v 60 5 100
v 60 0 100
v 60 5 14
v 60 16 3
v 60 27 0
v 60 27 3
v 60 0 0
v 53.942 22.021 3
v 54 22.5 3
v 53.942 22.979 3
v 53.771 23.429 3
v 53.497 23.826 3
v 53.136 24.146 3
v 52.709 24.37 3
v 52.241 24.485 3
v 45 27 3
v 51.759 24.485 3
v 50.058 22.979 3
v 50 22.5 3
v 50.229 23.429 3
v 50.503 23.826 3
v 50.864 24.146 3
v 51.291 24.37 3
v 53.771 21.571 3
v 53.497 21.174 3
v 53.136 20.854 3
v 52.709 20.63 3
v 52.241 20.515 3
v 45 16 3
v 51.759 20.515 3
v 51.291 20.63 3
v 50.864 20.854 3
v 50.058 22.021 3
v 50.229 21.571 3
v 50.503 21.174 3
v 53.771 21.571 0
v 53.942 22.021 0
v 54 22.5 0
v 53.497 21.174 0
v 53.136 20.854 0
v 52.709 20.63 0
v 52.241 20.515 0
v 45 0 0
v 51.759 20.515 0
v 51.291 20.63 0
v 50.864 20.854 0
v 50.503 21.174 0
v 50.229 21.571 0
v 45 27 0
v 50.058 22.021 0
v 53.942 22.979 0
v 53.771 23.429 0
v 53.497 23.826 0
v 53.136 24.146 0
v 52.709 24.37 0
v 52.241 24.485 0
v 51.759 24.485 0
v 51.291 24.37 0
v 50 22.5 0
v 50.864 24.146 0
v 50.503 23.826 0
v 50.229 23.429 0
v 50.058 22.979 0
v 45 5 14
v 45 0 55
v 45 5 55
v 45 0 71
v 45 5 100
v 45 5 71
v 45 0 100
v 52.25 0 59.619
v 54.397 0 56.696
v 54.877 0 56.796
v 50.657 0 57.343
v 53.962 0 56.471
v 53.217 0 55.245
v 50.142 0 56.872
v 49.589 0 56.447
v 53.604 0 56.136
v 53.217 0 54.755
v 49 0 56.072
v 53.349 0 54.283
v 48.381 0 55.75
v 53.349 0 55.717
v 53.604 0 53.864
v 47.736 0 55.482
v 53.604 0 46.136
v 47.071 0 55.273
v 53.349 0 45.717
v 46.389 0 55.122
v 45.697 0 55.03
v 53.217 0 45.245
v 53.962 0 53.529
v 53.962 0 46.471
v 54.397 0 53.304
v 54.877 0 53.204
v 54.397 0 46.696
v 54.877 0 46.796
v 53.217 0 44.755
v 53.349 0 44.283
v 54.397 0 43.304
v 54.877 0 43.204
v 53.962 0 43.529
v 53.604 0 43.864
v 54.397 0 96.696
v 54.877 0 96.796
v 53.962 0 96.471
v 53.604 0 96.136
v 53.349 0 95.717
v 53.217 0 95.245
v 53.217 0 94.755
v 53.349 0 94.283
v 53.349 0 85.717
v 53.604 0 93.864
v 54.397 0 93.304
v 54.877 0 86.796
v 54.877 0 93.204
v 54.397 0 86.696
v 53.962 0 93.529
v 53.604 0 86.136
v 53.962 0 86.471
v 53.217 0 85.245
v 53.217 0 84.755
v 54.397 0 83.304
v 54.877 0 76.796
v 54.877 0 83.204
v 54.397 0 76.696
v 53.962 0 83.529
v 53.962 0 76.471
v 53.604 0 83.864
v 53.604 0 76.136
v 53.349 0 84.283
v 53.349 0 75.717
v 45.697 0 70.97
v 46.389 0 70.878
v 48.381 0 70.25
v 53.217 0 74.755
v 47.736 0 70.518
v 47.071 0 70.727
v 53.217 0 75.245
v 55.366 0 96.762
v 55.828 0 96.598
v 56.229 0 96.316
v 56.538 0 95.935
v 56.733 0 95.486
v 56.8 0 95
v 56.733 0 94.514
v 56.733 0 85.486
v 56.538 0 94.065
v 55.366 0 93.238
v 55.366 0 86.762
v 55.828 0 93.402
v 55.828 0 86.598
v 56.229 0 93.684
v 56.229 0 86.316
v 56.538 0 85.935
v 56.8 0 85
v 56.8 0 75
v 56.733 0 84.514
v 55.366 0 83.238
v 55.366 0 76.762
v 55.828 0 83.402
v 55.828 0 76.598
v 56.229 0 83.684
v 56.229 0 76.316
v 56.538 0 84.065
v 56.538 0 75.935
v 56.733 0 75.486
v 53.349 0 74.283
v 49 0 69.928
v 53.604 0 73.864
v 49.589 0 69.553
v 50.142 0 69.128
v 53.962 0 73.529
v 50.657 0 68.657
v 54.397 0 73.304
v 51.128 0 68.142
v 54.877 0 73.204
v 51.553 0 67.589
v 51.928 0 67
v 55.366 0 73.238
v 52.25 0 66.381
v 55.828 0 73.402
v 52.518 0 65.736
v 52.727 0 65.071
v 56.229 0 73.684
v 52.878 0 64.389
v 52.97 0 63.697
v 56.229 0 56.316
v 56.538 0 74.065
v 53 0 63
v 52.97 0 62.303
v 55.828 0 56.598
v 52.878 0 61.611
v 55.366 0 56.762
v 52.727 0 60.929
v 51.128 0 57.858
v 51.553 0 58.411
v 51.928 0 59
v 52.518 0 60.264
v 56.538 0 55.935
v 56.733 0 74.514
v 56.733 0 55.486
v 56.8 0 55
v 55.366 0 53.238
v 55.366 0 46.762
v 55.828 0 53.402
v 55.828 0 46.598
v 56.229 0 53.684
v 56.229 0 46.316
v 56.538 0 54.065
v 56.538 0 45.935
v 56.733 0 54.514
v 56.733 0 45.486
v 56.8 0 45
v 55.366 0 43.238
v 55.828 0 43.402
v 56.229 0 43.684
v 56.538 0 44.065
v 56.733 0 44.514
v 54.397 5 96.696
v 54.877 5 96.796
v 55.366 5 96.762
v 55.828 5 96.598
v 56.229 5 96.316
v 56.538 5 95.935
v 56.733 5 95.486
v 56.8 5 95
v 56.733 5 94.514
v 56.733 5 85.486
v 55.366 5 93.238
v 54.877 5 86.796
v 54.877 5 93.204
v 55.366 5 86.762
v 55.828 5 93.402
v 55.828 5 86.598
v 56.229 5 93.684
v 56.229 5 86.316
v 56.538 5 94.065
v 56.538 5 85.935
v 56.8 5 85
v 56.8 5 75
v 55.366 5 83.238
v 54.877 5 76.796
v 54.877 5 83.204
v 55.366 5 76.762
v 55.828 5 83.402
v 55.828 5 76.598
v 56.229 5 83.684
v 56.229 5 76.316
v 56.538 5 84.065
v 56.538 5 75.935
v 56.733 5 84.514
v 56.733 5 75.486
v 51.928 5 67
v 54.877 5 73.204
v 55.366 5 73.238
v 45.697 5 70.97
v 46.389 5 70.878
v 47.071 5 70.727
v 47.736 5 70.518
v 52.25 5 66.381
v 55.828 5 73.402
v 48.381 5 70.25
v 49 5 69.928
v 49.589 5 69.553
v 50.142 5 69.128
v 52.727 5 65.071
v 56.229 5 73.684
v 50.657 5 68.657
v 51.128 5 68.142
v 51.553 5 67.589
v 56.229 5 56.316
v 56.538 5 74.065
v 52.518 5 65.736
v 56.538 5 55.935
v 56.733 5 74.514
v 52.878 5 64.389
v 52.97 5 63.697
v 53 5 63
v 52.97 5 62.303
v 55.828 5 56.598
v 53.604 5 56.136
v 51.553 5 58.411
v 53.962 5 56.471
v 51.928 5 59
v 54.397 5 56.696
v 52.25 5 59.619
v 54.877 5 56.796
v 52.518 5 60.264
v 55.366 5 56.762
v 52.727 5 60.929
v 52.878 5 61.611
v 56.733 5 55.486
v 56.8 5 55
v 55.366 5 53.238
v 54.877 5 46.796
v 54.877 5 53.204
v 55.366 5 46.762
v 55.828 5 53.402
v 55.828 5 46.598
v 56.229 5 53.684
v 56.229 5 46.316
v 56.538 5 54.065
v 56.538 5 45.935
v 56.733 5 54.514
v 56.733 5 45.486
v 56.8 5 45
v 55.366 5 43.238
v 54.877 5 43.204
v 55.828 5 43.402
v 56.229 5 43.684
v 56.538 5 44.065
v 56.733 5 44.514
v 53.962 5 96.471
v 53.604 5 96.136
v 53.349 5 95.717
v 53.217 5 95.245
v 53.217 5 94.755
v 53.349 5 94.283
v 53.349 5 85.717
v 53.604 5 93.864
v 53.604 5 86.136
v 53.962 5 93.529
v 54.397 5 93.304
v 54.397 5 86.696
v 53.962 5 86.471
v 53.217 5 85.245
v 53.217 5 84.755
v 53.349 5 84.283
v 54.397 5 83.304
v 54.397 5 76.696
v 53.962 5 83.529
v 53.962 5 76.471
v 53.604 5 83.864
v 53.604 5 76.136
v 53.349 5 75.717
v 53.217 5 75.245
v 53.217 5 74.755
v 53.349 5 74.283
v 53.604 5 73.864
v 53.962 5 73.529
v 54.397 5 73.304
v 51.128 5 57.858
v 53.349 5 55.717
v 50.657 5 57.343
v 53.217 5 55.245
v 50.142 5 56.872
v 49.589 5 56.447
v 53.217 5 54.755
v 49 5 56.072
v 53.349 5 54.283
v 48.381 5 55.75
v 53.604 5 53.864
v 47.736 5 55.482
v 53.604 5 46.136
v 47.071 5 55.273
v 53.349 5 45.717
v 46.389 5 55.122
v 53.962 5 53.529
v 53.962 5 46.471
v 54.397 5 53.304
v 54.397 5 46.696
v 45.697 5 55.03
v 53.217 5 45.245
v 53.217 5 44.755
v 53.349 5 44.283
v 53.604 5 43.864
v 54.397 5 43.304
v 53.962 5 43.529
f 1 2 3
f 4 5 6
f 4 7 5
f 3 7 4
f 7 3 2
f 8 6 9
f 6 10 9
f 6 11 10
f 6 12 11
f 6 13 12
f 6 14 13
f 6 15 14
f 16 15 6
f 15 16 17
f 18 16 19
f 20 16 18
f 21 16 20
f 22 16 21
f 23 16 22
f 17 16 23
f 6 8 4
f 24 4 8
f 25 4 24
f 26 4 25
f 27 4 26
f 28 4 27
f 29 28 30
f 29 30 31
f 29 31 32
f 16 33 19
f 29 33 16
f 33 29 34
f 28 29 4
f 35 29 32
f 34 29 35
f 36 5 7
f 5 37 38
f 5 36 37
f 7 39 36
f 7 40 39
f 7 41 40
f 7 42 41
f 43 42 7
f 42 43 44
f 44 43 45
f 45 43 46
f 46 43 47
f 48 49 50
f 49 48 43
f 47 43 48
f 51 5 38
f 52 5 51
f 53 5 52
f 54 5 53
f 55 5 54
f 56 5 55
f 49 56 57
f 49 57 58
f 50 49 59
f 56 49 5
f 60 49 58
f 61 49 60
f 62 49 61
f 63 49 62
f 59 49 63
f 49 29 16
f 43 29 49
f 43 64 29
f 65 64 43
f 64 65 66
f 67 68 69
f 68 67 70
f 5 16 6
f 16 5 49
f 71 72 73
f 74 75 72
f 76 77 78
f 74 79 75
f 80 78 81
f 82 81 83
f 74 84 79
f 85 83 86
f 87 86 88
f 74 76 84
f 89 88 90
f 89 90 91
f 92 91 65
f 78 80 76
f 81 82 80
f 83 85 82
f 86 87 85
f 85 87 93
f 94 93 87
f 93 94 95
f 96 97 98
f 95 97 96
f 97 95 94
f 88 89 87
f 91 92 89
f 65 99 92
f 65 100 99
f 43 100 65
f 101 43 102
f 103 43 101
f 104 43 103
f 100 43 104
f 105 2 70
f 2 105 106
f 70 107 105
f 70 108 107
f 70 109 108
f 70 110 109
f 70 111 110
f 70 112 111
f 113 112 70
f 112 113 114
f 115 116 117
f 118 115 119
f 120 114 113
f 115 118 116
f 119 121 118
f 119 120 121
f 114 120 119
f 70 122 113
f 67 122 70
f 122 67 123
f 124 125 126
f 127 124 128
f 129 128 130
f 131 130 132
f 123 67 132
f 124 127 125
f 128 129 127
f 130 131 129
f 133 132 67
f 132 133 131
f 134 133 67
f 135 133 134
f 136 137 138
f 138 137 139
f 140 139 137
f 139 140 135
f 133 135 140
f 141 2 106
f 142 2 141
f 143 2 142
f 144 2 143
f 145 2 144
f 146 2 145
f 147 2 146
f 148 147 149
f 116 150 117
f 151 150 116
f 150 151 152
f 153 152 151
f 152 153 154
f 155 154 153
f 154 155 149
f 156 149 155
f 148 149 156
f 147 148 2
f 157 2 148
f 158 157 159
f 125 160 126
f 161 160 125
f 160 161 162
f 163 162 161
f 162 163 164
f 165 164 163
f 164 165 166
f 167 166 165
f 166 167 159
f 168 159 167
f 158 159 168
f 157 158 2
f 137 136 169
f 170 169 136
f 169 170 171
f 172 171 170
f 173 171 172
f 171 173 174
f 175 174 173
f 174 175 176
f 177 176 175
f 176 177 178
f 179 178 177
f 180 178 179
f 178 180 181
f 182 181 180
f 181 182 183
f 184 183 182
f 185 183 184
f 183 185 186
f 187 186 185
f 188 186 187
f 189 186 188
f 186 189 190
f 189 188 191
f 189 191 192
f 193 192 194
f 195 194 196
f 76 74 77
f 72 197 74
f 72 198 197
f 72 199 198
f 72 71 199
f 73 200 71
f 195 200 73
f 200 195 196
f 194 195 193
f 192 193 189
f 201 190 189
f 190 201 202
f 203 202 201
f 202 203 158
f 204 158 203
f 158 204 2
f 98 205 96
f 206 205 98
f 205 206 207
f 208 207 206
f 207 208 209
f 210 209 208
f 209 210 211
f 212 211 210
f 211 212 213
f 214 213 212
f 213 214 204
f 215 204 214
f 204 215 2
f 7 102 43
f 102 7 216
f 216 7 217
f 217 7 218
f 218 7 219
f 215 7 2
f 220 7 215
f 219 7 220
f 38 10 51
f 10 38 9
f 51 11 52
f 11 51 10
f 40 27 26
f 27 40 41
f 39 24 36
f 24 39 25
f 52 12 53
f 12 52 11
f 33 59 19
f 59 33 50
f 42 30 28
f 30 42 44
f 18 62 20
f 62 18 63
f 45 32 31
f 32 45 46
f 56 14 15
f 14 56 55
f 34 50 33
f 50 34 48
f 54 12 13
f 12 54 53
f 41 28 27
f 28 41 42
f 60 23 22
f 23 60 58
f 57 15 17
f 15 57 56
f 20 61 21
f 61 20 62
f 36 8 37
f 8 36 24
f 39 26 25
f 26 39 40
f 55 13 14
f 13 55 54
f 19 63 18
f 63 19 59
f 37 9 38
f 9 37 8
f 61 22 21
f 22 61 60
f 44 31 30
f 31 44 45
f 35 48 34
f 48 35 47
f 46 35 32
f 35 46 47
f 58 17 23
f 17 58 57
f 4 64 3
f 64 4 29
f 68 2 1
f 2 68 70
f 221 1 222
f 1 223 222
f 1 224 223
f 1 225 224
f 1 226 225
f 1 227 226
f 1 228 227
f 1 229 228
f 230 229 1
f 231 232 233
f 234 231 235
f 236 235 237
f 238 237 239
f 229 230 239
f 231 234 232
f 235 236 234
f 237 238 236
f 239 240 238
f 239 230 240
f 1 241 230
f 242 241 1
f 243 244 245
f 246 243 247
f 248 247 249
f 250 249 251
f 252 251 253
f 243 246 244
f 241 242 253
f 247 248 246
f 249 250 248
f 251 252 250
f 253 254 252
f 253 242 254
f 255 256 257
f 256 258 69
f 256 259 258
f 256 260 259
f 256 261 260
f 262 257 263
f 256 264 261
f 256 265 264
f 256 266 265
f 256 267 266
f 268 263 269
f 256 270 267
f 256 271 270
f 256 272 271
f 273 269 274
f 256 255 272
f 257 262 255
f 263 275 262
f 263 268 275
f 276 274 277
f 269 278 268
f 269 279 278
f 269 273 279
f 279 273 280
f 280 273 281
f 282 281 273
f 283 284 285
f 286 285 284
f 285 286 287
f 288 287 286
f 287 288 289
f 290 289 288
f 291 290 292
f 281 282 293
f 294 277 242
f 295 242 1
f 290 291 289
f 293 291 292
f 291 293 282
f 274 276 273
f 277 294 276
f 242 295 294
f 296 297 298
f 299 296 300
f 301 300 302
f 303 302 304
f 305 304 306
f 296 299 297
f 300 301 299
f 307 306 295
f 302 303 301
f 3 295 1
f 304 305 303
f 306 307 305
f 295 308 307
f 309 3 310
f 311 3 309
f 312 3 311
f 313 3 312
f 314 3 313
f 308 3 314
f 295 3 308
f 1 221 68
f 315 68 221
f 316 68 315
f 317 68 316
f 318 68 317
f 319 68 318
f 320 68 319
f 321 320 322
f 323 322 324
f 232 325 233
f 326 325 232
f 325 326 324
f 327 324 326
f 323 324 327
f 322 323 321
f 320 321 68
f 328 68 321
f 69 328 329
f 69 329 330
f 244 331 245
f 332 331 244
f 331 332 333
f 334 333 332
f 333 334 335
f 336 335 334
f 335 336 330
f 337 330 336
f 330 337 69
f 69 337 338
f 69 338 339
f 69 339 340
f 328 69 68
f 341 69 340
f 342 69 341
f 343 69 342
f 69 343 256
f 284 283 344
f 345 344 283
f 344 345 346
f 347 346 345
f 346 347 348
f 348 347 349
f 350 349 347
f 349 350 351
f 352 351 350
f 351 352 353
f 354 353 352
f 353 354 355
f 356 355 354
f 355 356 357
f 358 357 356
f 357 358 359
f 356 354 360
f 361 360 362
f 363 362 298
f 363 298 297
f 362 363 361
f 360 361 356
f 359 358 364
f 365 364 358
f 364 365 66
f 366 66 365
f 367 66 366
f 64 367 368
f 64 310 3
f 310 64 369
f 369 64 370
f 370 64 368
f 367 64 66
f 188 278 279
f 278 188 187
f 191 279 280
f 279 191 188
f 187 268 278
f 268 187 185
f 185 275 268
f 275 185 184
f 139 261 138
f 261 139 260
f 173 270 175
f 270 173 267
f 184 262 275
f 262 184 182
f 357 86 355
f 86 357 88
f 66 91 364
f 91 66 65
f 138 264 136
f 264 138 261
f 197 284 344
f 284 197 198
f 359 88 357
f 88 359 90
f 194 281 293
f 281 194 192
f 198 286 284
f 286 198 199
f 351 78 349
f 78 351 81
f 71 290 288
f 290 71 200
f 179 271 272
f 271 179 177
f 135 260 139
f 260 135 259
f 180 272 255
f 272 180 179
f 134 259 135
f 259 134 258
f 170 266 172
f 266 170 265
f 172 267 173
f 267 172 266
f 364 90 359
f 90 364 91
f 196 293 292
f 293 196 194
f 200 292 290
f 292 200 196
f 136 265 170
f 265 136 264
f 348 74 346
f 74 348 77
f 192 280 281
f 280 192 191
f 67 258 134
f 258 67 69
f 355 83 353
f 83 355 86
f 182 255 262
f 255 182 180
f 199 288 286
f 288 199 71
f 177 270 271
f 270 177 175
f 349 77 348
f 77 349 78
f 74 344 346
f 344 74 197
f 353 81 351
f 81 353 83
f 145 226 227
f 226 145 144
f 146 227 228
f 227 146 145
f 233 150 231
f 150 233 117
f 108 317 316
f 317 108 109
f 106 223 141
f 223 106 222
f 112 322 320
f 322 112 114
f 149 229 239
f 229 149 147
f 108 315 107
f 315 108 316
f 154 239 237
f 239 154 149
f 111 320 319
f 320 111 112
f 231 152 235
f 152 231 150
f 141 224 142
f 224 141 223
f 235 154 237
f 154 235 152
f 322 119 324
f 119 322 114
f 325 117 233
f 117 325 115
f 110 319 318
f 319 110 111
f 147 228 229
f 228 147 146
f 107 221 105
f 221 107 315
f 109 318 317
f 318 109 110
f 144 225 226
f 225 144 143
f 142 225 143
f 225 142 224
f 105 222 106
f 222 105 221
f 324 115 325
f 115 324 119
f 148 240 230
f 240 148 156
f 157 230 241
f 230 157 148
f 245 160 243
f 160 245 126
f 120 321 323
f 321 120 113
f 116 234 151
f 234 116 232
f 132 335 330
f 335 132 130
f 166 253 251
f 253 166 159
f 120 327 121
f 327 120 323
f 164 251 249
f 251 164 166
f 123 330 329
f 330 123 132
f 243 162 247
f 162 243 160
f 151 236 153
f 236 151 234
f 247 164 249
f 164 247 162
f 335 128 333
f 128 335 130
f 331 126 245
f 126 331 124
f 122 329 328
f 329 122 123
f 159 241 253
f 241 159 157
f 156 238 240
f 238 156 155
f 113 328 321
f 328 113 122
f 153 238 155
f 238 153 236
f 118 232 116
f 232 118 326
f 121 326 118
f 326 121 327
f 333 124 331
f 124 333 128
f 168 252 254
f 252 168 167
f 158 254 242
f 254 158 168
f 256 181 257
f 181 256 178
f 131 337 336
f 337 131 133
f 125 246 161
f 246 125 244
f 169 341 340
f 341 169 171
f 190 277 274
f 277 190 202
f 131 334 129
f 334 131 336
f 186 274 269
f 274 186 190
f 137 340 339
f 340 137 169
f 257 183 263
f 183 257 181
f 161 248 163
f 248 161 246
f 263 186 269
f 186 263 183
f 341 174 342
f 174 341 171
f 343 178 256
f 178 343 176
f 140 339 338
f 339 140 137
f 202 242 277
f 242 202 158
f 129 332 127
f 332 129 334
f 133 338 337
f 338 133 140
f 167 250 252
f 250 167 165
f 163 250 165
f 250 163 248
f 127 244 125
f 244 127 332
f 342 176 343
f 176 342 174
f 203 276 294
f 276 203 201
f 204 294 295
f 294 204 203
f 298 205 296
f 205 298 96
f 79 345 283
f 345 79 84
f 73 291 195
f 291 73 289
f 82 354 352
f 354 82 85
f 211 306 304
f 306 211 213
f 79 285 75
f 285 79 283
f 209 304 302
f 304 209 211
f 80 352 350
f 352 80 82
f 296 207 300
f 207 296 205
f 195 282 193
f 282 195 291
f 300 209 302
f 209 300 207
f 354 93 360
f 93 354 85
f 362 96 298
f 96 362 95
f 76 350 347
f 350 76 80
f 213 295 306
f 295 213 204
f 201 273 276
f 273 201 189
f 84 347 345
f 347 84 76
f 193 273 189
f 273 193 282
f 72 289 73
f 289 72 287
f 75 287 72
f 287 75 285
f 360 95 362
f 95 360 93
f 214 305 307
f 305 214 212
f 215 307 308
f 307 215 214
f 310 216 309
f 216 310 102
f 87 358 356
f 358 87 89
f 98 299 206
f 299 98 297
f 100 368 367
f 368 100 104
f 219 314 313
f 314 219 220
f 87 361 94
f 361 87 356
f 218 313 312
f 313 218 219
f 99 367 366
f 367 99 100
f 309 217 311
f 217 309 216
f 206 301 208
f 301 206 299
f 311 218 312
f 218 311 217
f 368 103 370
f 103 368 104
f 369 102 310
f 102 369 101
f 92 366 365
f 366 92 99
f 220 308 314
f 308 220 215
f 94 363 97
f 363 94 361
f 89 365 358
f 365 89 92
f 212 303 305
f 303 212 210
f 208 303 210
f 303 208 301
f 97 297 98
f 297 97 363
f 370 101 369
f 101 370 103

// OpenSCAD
// Increase the resolution of default shapes
$fa = 5; // Minimum angle for fragments [degrees]
$fs = 0.5; // Minimum fragment size [mm]


module soporte(alt,anc){
	refuerzo = 19;
	union() {
		difference(){
			cube([15,27,3]);
			#translate([10-anc,22.5,0])cylinder(r=2,h=30,center=true);
		}
		intersection() {
			cube([15,refuerzo,refuerzo]);
			translate([0,-refuerzo,0]) rotate([-45,0,0]) cube([15,refuerzo*sqrt(2),refuerzo*sqrt(2)]);
		}
		cube([15,5,alt]);
	}
}

module soporteUltraSonidos(altura,anchura){

difference(){
union(){
	//soporte(alt=altura,anc=0);
	difference(){	
		translate([anchura,0,0])soporte(alt=altura,anc=3);
		#translate([45,10,63])rotate([90,0,0])cylinder(r=8,h=20);
	}
}
for(i=[0:10:50]){
if(i<30 || i>=40){
translate([5+0,5,altura-5-i])rotate([90,0,0])cylinder(r=1.8,h=20,center=true);
translate([5+50,5,altura-5-i])rotate([90,0,0])cylinder(r=1.8,h=20,center=true);
}
}
}
}
soporteUltraSonidos(altura=100,anchura=45);
